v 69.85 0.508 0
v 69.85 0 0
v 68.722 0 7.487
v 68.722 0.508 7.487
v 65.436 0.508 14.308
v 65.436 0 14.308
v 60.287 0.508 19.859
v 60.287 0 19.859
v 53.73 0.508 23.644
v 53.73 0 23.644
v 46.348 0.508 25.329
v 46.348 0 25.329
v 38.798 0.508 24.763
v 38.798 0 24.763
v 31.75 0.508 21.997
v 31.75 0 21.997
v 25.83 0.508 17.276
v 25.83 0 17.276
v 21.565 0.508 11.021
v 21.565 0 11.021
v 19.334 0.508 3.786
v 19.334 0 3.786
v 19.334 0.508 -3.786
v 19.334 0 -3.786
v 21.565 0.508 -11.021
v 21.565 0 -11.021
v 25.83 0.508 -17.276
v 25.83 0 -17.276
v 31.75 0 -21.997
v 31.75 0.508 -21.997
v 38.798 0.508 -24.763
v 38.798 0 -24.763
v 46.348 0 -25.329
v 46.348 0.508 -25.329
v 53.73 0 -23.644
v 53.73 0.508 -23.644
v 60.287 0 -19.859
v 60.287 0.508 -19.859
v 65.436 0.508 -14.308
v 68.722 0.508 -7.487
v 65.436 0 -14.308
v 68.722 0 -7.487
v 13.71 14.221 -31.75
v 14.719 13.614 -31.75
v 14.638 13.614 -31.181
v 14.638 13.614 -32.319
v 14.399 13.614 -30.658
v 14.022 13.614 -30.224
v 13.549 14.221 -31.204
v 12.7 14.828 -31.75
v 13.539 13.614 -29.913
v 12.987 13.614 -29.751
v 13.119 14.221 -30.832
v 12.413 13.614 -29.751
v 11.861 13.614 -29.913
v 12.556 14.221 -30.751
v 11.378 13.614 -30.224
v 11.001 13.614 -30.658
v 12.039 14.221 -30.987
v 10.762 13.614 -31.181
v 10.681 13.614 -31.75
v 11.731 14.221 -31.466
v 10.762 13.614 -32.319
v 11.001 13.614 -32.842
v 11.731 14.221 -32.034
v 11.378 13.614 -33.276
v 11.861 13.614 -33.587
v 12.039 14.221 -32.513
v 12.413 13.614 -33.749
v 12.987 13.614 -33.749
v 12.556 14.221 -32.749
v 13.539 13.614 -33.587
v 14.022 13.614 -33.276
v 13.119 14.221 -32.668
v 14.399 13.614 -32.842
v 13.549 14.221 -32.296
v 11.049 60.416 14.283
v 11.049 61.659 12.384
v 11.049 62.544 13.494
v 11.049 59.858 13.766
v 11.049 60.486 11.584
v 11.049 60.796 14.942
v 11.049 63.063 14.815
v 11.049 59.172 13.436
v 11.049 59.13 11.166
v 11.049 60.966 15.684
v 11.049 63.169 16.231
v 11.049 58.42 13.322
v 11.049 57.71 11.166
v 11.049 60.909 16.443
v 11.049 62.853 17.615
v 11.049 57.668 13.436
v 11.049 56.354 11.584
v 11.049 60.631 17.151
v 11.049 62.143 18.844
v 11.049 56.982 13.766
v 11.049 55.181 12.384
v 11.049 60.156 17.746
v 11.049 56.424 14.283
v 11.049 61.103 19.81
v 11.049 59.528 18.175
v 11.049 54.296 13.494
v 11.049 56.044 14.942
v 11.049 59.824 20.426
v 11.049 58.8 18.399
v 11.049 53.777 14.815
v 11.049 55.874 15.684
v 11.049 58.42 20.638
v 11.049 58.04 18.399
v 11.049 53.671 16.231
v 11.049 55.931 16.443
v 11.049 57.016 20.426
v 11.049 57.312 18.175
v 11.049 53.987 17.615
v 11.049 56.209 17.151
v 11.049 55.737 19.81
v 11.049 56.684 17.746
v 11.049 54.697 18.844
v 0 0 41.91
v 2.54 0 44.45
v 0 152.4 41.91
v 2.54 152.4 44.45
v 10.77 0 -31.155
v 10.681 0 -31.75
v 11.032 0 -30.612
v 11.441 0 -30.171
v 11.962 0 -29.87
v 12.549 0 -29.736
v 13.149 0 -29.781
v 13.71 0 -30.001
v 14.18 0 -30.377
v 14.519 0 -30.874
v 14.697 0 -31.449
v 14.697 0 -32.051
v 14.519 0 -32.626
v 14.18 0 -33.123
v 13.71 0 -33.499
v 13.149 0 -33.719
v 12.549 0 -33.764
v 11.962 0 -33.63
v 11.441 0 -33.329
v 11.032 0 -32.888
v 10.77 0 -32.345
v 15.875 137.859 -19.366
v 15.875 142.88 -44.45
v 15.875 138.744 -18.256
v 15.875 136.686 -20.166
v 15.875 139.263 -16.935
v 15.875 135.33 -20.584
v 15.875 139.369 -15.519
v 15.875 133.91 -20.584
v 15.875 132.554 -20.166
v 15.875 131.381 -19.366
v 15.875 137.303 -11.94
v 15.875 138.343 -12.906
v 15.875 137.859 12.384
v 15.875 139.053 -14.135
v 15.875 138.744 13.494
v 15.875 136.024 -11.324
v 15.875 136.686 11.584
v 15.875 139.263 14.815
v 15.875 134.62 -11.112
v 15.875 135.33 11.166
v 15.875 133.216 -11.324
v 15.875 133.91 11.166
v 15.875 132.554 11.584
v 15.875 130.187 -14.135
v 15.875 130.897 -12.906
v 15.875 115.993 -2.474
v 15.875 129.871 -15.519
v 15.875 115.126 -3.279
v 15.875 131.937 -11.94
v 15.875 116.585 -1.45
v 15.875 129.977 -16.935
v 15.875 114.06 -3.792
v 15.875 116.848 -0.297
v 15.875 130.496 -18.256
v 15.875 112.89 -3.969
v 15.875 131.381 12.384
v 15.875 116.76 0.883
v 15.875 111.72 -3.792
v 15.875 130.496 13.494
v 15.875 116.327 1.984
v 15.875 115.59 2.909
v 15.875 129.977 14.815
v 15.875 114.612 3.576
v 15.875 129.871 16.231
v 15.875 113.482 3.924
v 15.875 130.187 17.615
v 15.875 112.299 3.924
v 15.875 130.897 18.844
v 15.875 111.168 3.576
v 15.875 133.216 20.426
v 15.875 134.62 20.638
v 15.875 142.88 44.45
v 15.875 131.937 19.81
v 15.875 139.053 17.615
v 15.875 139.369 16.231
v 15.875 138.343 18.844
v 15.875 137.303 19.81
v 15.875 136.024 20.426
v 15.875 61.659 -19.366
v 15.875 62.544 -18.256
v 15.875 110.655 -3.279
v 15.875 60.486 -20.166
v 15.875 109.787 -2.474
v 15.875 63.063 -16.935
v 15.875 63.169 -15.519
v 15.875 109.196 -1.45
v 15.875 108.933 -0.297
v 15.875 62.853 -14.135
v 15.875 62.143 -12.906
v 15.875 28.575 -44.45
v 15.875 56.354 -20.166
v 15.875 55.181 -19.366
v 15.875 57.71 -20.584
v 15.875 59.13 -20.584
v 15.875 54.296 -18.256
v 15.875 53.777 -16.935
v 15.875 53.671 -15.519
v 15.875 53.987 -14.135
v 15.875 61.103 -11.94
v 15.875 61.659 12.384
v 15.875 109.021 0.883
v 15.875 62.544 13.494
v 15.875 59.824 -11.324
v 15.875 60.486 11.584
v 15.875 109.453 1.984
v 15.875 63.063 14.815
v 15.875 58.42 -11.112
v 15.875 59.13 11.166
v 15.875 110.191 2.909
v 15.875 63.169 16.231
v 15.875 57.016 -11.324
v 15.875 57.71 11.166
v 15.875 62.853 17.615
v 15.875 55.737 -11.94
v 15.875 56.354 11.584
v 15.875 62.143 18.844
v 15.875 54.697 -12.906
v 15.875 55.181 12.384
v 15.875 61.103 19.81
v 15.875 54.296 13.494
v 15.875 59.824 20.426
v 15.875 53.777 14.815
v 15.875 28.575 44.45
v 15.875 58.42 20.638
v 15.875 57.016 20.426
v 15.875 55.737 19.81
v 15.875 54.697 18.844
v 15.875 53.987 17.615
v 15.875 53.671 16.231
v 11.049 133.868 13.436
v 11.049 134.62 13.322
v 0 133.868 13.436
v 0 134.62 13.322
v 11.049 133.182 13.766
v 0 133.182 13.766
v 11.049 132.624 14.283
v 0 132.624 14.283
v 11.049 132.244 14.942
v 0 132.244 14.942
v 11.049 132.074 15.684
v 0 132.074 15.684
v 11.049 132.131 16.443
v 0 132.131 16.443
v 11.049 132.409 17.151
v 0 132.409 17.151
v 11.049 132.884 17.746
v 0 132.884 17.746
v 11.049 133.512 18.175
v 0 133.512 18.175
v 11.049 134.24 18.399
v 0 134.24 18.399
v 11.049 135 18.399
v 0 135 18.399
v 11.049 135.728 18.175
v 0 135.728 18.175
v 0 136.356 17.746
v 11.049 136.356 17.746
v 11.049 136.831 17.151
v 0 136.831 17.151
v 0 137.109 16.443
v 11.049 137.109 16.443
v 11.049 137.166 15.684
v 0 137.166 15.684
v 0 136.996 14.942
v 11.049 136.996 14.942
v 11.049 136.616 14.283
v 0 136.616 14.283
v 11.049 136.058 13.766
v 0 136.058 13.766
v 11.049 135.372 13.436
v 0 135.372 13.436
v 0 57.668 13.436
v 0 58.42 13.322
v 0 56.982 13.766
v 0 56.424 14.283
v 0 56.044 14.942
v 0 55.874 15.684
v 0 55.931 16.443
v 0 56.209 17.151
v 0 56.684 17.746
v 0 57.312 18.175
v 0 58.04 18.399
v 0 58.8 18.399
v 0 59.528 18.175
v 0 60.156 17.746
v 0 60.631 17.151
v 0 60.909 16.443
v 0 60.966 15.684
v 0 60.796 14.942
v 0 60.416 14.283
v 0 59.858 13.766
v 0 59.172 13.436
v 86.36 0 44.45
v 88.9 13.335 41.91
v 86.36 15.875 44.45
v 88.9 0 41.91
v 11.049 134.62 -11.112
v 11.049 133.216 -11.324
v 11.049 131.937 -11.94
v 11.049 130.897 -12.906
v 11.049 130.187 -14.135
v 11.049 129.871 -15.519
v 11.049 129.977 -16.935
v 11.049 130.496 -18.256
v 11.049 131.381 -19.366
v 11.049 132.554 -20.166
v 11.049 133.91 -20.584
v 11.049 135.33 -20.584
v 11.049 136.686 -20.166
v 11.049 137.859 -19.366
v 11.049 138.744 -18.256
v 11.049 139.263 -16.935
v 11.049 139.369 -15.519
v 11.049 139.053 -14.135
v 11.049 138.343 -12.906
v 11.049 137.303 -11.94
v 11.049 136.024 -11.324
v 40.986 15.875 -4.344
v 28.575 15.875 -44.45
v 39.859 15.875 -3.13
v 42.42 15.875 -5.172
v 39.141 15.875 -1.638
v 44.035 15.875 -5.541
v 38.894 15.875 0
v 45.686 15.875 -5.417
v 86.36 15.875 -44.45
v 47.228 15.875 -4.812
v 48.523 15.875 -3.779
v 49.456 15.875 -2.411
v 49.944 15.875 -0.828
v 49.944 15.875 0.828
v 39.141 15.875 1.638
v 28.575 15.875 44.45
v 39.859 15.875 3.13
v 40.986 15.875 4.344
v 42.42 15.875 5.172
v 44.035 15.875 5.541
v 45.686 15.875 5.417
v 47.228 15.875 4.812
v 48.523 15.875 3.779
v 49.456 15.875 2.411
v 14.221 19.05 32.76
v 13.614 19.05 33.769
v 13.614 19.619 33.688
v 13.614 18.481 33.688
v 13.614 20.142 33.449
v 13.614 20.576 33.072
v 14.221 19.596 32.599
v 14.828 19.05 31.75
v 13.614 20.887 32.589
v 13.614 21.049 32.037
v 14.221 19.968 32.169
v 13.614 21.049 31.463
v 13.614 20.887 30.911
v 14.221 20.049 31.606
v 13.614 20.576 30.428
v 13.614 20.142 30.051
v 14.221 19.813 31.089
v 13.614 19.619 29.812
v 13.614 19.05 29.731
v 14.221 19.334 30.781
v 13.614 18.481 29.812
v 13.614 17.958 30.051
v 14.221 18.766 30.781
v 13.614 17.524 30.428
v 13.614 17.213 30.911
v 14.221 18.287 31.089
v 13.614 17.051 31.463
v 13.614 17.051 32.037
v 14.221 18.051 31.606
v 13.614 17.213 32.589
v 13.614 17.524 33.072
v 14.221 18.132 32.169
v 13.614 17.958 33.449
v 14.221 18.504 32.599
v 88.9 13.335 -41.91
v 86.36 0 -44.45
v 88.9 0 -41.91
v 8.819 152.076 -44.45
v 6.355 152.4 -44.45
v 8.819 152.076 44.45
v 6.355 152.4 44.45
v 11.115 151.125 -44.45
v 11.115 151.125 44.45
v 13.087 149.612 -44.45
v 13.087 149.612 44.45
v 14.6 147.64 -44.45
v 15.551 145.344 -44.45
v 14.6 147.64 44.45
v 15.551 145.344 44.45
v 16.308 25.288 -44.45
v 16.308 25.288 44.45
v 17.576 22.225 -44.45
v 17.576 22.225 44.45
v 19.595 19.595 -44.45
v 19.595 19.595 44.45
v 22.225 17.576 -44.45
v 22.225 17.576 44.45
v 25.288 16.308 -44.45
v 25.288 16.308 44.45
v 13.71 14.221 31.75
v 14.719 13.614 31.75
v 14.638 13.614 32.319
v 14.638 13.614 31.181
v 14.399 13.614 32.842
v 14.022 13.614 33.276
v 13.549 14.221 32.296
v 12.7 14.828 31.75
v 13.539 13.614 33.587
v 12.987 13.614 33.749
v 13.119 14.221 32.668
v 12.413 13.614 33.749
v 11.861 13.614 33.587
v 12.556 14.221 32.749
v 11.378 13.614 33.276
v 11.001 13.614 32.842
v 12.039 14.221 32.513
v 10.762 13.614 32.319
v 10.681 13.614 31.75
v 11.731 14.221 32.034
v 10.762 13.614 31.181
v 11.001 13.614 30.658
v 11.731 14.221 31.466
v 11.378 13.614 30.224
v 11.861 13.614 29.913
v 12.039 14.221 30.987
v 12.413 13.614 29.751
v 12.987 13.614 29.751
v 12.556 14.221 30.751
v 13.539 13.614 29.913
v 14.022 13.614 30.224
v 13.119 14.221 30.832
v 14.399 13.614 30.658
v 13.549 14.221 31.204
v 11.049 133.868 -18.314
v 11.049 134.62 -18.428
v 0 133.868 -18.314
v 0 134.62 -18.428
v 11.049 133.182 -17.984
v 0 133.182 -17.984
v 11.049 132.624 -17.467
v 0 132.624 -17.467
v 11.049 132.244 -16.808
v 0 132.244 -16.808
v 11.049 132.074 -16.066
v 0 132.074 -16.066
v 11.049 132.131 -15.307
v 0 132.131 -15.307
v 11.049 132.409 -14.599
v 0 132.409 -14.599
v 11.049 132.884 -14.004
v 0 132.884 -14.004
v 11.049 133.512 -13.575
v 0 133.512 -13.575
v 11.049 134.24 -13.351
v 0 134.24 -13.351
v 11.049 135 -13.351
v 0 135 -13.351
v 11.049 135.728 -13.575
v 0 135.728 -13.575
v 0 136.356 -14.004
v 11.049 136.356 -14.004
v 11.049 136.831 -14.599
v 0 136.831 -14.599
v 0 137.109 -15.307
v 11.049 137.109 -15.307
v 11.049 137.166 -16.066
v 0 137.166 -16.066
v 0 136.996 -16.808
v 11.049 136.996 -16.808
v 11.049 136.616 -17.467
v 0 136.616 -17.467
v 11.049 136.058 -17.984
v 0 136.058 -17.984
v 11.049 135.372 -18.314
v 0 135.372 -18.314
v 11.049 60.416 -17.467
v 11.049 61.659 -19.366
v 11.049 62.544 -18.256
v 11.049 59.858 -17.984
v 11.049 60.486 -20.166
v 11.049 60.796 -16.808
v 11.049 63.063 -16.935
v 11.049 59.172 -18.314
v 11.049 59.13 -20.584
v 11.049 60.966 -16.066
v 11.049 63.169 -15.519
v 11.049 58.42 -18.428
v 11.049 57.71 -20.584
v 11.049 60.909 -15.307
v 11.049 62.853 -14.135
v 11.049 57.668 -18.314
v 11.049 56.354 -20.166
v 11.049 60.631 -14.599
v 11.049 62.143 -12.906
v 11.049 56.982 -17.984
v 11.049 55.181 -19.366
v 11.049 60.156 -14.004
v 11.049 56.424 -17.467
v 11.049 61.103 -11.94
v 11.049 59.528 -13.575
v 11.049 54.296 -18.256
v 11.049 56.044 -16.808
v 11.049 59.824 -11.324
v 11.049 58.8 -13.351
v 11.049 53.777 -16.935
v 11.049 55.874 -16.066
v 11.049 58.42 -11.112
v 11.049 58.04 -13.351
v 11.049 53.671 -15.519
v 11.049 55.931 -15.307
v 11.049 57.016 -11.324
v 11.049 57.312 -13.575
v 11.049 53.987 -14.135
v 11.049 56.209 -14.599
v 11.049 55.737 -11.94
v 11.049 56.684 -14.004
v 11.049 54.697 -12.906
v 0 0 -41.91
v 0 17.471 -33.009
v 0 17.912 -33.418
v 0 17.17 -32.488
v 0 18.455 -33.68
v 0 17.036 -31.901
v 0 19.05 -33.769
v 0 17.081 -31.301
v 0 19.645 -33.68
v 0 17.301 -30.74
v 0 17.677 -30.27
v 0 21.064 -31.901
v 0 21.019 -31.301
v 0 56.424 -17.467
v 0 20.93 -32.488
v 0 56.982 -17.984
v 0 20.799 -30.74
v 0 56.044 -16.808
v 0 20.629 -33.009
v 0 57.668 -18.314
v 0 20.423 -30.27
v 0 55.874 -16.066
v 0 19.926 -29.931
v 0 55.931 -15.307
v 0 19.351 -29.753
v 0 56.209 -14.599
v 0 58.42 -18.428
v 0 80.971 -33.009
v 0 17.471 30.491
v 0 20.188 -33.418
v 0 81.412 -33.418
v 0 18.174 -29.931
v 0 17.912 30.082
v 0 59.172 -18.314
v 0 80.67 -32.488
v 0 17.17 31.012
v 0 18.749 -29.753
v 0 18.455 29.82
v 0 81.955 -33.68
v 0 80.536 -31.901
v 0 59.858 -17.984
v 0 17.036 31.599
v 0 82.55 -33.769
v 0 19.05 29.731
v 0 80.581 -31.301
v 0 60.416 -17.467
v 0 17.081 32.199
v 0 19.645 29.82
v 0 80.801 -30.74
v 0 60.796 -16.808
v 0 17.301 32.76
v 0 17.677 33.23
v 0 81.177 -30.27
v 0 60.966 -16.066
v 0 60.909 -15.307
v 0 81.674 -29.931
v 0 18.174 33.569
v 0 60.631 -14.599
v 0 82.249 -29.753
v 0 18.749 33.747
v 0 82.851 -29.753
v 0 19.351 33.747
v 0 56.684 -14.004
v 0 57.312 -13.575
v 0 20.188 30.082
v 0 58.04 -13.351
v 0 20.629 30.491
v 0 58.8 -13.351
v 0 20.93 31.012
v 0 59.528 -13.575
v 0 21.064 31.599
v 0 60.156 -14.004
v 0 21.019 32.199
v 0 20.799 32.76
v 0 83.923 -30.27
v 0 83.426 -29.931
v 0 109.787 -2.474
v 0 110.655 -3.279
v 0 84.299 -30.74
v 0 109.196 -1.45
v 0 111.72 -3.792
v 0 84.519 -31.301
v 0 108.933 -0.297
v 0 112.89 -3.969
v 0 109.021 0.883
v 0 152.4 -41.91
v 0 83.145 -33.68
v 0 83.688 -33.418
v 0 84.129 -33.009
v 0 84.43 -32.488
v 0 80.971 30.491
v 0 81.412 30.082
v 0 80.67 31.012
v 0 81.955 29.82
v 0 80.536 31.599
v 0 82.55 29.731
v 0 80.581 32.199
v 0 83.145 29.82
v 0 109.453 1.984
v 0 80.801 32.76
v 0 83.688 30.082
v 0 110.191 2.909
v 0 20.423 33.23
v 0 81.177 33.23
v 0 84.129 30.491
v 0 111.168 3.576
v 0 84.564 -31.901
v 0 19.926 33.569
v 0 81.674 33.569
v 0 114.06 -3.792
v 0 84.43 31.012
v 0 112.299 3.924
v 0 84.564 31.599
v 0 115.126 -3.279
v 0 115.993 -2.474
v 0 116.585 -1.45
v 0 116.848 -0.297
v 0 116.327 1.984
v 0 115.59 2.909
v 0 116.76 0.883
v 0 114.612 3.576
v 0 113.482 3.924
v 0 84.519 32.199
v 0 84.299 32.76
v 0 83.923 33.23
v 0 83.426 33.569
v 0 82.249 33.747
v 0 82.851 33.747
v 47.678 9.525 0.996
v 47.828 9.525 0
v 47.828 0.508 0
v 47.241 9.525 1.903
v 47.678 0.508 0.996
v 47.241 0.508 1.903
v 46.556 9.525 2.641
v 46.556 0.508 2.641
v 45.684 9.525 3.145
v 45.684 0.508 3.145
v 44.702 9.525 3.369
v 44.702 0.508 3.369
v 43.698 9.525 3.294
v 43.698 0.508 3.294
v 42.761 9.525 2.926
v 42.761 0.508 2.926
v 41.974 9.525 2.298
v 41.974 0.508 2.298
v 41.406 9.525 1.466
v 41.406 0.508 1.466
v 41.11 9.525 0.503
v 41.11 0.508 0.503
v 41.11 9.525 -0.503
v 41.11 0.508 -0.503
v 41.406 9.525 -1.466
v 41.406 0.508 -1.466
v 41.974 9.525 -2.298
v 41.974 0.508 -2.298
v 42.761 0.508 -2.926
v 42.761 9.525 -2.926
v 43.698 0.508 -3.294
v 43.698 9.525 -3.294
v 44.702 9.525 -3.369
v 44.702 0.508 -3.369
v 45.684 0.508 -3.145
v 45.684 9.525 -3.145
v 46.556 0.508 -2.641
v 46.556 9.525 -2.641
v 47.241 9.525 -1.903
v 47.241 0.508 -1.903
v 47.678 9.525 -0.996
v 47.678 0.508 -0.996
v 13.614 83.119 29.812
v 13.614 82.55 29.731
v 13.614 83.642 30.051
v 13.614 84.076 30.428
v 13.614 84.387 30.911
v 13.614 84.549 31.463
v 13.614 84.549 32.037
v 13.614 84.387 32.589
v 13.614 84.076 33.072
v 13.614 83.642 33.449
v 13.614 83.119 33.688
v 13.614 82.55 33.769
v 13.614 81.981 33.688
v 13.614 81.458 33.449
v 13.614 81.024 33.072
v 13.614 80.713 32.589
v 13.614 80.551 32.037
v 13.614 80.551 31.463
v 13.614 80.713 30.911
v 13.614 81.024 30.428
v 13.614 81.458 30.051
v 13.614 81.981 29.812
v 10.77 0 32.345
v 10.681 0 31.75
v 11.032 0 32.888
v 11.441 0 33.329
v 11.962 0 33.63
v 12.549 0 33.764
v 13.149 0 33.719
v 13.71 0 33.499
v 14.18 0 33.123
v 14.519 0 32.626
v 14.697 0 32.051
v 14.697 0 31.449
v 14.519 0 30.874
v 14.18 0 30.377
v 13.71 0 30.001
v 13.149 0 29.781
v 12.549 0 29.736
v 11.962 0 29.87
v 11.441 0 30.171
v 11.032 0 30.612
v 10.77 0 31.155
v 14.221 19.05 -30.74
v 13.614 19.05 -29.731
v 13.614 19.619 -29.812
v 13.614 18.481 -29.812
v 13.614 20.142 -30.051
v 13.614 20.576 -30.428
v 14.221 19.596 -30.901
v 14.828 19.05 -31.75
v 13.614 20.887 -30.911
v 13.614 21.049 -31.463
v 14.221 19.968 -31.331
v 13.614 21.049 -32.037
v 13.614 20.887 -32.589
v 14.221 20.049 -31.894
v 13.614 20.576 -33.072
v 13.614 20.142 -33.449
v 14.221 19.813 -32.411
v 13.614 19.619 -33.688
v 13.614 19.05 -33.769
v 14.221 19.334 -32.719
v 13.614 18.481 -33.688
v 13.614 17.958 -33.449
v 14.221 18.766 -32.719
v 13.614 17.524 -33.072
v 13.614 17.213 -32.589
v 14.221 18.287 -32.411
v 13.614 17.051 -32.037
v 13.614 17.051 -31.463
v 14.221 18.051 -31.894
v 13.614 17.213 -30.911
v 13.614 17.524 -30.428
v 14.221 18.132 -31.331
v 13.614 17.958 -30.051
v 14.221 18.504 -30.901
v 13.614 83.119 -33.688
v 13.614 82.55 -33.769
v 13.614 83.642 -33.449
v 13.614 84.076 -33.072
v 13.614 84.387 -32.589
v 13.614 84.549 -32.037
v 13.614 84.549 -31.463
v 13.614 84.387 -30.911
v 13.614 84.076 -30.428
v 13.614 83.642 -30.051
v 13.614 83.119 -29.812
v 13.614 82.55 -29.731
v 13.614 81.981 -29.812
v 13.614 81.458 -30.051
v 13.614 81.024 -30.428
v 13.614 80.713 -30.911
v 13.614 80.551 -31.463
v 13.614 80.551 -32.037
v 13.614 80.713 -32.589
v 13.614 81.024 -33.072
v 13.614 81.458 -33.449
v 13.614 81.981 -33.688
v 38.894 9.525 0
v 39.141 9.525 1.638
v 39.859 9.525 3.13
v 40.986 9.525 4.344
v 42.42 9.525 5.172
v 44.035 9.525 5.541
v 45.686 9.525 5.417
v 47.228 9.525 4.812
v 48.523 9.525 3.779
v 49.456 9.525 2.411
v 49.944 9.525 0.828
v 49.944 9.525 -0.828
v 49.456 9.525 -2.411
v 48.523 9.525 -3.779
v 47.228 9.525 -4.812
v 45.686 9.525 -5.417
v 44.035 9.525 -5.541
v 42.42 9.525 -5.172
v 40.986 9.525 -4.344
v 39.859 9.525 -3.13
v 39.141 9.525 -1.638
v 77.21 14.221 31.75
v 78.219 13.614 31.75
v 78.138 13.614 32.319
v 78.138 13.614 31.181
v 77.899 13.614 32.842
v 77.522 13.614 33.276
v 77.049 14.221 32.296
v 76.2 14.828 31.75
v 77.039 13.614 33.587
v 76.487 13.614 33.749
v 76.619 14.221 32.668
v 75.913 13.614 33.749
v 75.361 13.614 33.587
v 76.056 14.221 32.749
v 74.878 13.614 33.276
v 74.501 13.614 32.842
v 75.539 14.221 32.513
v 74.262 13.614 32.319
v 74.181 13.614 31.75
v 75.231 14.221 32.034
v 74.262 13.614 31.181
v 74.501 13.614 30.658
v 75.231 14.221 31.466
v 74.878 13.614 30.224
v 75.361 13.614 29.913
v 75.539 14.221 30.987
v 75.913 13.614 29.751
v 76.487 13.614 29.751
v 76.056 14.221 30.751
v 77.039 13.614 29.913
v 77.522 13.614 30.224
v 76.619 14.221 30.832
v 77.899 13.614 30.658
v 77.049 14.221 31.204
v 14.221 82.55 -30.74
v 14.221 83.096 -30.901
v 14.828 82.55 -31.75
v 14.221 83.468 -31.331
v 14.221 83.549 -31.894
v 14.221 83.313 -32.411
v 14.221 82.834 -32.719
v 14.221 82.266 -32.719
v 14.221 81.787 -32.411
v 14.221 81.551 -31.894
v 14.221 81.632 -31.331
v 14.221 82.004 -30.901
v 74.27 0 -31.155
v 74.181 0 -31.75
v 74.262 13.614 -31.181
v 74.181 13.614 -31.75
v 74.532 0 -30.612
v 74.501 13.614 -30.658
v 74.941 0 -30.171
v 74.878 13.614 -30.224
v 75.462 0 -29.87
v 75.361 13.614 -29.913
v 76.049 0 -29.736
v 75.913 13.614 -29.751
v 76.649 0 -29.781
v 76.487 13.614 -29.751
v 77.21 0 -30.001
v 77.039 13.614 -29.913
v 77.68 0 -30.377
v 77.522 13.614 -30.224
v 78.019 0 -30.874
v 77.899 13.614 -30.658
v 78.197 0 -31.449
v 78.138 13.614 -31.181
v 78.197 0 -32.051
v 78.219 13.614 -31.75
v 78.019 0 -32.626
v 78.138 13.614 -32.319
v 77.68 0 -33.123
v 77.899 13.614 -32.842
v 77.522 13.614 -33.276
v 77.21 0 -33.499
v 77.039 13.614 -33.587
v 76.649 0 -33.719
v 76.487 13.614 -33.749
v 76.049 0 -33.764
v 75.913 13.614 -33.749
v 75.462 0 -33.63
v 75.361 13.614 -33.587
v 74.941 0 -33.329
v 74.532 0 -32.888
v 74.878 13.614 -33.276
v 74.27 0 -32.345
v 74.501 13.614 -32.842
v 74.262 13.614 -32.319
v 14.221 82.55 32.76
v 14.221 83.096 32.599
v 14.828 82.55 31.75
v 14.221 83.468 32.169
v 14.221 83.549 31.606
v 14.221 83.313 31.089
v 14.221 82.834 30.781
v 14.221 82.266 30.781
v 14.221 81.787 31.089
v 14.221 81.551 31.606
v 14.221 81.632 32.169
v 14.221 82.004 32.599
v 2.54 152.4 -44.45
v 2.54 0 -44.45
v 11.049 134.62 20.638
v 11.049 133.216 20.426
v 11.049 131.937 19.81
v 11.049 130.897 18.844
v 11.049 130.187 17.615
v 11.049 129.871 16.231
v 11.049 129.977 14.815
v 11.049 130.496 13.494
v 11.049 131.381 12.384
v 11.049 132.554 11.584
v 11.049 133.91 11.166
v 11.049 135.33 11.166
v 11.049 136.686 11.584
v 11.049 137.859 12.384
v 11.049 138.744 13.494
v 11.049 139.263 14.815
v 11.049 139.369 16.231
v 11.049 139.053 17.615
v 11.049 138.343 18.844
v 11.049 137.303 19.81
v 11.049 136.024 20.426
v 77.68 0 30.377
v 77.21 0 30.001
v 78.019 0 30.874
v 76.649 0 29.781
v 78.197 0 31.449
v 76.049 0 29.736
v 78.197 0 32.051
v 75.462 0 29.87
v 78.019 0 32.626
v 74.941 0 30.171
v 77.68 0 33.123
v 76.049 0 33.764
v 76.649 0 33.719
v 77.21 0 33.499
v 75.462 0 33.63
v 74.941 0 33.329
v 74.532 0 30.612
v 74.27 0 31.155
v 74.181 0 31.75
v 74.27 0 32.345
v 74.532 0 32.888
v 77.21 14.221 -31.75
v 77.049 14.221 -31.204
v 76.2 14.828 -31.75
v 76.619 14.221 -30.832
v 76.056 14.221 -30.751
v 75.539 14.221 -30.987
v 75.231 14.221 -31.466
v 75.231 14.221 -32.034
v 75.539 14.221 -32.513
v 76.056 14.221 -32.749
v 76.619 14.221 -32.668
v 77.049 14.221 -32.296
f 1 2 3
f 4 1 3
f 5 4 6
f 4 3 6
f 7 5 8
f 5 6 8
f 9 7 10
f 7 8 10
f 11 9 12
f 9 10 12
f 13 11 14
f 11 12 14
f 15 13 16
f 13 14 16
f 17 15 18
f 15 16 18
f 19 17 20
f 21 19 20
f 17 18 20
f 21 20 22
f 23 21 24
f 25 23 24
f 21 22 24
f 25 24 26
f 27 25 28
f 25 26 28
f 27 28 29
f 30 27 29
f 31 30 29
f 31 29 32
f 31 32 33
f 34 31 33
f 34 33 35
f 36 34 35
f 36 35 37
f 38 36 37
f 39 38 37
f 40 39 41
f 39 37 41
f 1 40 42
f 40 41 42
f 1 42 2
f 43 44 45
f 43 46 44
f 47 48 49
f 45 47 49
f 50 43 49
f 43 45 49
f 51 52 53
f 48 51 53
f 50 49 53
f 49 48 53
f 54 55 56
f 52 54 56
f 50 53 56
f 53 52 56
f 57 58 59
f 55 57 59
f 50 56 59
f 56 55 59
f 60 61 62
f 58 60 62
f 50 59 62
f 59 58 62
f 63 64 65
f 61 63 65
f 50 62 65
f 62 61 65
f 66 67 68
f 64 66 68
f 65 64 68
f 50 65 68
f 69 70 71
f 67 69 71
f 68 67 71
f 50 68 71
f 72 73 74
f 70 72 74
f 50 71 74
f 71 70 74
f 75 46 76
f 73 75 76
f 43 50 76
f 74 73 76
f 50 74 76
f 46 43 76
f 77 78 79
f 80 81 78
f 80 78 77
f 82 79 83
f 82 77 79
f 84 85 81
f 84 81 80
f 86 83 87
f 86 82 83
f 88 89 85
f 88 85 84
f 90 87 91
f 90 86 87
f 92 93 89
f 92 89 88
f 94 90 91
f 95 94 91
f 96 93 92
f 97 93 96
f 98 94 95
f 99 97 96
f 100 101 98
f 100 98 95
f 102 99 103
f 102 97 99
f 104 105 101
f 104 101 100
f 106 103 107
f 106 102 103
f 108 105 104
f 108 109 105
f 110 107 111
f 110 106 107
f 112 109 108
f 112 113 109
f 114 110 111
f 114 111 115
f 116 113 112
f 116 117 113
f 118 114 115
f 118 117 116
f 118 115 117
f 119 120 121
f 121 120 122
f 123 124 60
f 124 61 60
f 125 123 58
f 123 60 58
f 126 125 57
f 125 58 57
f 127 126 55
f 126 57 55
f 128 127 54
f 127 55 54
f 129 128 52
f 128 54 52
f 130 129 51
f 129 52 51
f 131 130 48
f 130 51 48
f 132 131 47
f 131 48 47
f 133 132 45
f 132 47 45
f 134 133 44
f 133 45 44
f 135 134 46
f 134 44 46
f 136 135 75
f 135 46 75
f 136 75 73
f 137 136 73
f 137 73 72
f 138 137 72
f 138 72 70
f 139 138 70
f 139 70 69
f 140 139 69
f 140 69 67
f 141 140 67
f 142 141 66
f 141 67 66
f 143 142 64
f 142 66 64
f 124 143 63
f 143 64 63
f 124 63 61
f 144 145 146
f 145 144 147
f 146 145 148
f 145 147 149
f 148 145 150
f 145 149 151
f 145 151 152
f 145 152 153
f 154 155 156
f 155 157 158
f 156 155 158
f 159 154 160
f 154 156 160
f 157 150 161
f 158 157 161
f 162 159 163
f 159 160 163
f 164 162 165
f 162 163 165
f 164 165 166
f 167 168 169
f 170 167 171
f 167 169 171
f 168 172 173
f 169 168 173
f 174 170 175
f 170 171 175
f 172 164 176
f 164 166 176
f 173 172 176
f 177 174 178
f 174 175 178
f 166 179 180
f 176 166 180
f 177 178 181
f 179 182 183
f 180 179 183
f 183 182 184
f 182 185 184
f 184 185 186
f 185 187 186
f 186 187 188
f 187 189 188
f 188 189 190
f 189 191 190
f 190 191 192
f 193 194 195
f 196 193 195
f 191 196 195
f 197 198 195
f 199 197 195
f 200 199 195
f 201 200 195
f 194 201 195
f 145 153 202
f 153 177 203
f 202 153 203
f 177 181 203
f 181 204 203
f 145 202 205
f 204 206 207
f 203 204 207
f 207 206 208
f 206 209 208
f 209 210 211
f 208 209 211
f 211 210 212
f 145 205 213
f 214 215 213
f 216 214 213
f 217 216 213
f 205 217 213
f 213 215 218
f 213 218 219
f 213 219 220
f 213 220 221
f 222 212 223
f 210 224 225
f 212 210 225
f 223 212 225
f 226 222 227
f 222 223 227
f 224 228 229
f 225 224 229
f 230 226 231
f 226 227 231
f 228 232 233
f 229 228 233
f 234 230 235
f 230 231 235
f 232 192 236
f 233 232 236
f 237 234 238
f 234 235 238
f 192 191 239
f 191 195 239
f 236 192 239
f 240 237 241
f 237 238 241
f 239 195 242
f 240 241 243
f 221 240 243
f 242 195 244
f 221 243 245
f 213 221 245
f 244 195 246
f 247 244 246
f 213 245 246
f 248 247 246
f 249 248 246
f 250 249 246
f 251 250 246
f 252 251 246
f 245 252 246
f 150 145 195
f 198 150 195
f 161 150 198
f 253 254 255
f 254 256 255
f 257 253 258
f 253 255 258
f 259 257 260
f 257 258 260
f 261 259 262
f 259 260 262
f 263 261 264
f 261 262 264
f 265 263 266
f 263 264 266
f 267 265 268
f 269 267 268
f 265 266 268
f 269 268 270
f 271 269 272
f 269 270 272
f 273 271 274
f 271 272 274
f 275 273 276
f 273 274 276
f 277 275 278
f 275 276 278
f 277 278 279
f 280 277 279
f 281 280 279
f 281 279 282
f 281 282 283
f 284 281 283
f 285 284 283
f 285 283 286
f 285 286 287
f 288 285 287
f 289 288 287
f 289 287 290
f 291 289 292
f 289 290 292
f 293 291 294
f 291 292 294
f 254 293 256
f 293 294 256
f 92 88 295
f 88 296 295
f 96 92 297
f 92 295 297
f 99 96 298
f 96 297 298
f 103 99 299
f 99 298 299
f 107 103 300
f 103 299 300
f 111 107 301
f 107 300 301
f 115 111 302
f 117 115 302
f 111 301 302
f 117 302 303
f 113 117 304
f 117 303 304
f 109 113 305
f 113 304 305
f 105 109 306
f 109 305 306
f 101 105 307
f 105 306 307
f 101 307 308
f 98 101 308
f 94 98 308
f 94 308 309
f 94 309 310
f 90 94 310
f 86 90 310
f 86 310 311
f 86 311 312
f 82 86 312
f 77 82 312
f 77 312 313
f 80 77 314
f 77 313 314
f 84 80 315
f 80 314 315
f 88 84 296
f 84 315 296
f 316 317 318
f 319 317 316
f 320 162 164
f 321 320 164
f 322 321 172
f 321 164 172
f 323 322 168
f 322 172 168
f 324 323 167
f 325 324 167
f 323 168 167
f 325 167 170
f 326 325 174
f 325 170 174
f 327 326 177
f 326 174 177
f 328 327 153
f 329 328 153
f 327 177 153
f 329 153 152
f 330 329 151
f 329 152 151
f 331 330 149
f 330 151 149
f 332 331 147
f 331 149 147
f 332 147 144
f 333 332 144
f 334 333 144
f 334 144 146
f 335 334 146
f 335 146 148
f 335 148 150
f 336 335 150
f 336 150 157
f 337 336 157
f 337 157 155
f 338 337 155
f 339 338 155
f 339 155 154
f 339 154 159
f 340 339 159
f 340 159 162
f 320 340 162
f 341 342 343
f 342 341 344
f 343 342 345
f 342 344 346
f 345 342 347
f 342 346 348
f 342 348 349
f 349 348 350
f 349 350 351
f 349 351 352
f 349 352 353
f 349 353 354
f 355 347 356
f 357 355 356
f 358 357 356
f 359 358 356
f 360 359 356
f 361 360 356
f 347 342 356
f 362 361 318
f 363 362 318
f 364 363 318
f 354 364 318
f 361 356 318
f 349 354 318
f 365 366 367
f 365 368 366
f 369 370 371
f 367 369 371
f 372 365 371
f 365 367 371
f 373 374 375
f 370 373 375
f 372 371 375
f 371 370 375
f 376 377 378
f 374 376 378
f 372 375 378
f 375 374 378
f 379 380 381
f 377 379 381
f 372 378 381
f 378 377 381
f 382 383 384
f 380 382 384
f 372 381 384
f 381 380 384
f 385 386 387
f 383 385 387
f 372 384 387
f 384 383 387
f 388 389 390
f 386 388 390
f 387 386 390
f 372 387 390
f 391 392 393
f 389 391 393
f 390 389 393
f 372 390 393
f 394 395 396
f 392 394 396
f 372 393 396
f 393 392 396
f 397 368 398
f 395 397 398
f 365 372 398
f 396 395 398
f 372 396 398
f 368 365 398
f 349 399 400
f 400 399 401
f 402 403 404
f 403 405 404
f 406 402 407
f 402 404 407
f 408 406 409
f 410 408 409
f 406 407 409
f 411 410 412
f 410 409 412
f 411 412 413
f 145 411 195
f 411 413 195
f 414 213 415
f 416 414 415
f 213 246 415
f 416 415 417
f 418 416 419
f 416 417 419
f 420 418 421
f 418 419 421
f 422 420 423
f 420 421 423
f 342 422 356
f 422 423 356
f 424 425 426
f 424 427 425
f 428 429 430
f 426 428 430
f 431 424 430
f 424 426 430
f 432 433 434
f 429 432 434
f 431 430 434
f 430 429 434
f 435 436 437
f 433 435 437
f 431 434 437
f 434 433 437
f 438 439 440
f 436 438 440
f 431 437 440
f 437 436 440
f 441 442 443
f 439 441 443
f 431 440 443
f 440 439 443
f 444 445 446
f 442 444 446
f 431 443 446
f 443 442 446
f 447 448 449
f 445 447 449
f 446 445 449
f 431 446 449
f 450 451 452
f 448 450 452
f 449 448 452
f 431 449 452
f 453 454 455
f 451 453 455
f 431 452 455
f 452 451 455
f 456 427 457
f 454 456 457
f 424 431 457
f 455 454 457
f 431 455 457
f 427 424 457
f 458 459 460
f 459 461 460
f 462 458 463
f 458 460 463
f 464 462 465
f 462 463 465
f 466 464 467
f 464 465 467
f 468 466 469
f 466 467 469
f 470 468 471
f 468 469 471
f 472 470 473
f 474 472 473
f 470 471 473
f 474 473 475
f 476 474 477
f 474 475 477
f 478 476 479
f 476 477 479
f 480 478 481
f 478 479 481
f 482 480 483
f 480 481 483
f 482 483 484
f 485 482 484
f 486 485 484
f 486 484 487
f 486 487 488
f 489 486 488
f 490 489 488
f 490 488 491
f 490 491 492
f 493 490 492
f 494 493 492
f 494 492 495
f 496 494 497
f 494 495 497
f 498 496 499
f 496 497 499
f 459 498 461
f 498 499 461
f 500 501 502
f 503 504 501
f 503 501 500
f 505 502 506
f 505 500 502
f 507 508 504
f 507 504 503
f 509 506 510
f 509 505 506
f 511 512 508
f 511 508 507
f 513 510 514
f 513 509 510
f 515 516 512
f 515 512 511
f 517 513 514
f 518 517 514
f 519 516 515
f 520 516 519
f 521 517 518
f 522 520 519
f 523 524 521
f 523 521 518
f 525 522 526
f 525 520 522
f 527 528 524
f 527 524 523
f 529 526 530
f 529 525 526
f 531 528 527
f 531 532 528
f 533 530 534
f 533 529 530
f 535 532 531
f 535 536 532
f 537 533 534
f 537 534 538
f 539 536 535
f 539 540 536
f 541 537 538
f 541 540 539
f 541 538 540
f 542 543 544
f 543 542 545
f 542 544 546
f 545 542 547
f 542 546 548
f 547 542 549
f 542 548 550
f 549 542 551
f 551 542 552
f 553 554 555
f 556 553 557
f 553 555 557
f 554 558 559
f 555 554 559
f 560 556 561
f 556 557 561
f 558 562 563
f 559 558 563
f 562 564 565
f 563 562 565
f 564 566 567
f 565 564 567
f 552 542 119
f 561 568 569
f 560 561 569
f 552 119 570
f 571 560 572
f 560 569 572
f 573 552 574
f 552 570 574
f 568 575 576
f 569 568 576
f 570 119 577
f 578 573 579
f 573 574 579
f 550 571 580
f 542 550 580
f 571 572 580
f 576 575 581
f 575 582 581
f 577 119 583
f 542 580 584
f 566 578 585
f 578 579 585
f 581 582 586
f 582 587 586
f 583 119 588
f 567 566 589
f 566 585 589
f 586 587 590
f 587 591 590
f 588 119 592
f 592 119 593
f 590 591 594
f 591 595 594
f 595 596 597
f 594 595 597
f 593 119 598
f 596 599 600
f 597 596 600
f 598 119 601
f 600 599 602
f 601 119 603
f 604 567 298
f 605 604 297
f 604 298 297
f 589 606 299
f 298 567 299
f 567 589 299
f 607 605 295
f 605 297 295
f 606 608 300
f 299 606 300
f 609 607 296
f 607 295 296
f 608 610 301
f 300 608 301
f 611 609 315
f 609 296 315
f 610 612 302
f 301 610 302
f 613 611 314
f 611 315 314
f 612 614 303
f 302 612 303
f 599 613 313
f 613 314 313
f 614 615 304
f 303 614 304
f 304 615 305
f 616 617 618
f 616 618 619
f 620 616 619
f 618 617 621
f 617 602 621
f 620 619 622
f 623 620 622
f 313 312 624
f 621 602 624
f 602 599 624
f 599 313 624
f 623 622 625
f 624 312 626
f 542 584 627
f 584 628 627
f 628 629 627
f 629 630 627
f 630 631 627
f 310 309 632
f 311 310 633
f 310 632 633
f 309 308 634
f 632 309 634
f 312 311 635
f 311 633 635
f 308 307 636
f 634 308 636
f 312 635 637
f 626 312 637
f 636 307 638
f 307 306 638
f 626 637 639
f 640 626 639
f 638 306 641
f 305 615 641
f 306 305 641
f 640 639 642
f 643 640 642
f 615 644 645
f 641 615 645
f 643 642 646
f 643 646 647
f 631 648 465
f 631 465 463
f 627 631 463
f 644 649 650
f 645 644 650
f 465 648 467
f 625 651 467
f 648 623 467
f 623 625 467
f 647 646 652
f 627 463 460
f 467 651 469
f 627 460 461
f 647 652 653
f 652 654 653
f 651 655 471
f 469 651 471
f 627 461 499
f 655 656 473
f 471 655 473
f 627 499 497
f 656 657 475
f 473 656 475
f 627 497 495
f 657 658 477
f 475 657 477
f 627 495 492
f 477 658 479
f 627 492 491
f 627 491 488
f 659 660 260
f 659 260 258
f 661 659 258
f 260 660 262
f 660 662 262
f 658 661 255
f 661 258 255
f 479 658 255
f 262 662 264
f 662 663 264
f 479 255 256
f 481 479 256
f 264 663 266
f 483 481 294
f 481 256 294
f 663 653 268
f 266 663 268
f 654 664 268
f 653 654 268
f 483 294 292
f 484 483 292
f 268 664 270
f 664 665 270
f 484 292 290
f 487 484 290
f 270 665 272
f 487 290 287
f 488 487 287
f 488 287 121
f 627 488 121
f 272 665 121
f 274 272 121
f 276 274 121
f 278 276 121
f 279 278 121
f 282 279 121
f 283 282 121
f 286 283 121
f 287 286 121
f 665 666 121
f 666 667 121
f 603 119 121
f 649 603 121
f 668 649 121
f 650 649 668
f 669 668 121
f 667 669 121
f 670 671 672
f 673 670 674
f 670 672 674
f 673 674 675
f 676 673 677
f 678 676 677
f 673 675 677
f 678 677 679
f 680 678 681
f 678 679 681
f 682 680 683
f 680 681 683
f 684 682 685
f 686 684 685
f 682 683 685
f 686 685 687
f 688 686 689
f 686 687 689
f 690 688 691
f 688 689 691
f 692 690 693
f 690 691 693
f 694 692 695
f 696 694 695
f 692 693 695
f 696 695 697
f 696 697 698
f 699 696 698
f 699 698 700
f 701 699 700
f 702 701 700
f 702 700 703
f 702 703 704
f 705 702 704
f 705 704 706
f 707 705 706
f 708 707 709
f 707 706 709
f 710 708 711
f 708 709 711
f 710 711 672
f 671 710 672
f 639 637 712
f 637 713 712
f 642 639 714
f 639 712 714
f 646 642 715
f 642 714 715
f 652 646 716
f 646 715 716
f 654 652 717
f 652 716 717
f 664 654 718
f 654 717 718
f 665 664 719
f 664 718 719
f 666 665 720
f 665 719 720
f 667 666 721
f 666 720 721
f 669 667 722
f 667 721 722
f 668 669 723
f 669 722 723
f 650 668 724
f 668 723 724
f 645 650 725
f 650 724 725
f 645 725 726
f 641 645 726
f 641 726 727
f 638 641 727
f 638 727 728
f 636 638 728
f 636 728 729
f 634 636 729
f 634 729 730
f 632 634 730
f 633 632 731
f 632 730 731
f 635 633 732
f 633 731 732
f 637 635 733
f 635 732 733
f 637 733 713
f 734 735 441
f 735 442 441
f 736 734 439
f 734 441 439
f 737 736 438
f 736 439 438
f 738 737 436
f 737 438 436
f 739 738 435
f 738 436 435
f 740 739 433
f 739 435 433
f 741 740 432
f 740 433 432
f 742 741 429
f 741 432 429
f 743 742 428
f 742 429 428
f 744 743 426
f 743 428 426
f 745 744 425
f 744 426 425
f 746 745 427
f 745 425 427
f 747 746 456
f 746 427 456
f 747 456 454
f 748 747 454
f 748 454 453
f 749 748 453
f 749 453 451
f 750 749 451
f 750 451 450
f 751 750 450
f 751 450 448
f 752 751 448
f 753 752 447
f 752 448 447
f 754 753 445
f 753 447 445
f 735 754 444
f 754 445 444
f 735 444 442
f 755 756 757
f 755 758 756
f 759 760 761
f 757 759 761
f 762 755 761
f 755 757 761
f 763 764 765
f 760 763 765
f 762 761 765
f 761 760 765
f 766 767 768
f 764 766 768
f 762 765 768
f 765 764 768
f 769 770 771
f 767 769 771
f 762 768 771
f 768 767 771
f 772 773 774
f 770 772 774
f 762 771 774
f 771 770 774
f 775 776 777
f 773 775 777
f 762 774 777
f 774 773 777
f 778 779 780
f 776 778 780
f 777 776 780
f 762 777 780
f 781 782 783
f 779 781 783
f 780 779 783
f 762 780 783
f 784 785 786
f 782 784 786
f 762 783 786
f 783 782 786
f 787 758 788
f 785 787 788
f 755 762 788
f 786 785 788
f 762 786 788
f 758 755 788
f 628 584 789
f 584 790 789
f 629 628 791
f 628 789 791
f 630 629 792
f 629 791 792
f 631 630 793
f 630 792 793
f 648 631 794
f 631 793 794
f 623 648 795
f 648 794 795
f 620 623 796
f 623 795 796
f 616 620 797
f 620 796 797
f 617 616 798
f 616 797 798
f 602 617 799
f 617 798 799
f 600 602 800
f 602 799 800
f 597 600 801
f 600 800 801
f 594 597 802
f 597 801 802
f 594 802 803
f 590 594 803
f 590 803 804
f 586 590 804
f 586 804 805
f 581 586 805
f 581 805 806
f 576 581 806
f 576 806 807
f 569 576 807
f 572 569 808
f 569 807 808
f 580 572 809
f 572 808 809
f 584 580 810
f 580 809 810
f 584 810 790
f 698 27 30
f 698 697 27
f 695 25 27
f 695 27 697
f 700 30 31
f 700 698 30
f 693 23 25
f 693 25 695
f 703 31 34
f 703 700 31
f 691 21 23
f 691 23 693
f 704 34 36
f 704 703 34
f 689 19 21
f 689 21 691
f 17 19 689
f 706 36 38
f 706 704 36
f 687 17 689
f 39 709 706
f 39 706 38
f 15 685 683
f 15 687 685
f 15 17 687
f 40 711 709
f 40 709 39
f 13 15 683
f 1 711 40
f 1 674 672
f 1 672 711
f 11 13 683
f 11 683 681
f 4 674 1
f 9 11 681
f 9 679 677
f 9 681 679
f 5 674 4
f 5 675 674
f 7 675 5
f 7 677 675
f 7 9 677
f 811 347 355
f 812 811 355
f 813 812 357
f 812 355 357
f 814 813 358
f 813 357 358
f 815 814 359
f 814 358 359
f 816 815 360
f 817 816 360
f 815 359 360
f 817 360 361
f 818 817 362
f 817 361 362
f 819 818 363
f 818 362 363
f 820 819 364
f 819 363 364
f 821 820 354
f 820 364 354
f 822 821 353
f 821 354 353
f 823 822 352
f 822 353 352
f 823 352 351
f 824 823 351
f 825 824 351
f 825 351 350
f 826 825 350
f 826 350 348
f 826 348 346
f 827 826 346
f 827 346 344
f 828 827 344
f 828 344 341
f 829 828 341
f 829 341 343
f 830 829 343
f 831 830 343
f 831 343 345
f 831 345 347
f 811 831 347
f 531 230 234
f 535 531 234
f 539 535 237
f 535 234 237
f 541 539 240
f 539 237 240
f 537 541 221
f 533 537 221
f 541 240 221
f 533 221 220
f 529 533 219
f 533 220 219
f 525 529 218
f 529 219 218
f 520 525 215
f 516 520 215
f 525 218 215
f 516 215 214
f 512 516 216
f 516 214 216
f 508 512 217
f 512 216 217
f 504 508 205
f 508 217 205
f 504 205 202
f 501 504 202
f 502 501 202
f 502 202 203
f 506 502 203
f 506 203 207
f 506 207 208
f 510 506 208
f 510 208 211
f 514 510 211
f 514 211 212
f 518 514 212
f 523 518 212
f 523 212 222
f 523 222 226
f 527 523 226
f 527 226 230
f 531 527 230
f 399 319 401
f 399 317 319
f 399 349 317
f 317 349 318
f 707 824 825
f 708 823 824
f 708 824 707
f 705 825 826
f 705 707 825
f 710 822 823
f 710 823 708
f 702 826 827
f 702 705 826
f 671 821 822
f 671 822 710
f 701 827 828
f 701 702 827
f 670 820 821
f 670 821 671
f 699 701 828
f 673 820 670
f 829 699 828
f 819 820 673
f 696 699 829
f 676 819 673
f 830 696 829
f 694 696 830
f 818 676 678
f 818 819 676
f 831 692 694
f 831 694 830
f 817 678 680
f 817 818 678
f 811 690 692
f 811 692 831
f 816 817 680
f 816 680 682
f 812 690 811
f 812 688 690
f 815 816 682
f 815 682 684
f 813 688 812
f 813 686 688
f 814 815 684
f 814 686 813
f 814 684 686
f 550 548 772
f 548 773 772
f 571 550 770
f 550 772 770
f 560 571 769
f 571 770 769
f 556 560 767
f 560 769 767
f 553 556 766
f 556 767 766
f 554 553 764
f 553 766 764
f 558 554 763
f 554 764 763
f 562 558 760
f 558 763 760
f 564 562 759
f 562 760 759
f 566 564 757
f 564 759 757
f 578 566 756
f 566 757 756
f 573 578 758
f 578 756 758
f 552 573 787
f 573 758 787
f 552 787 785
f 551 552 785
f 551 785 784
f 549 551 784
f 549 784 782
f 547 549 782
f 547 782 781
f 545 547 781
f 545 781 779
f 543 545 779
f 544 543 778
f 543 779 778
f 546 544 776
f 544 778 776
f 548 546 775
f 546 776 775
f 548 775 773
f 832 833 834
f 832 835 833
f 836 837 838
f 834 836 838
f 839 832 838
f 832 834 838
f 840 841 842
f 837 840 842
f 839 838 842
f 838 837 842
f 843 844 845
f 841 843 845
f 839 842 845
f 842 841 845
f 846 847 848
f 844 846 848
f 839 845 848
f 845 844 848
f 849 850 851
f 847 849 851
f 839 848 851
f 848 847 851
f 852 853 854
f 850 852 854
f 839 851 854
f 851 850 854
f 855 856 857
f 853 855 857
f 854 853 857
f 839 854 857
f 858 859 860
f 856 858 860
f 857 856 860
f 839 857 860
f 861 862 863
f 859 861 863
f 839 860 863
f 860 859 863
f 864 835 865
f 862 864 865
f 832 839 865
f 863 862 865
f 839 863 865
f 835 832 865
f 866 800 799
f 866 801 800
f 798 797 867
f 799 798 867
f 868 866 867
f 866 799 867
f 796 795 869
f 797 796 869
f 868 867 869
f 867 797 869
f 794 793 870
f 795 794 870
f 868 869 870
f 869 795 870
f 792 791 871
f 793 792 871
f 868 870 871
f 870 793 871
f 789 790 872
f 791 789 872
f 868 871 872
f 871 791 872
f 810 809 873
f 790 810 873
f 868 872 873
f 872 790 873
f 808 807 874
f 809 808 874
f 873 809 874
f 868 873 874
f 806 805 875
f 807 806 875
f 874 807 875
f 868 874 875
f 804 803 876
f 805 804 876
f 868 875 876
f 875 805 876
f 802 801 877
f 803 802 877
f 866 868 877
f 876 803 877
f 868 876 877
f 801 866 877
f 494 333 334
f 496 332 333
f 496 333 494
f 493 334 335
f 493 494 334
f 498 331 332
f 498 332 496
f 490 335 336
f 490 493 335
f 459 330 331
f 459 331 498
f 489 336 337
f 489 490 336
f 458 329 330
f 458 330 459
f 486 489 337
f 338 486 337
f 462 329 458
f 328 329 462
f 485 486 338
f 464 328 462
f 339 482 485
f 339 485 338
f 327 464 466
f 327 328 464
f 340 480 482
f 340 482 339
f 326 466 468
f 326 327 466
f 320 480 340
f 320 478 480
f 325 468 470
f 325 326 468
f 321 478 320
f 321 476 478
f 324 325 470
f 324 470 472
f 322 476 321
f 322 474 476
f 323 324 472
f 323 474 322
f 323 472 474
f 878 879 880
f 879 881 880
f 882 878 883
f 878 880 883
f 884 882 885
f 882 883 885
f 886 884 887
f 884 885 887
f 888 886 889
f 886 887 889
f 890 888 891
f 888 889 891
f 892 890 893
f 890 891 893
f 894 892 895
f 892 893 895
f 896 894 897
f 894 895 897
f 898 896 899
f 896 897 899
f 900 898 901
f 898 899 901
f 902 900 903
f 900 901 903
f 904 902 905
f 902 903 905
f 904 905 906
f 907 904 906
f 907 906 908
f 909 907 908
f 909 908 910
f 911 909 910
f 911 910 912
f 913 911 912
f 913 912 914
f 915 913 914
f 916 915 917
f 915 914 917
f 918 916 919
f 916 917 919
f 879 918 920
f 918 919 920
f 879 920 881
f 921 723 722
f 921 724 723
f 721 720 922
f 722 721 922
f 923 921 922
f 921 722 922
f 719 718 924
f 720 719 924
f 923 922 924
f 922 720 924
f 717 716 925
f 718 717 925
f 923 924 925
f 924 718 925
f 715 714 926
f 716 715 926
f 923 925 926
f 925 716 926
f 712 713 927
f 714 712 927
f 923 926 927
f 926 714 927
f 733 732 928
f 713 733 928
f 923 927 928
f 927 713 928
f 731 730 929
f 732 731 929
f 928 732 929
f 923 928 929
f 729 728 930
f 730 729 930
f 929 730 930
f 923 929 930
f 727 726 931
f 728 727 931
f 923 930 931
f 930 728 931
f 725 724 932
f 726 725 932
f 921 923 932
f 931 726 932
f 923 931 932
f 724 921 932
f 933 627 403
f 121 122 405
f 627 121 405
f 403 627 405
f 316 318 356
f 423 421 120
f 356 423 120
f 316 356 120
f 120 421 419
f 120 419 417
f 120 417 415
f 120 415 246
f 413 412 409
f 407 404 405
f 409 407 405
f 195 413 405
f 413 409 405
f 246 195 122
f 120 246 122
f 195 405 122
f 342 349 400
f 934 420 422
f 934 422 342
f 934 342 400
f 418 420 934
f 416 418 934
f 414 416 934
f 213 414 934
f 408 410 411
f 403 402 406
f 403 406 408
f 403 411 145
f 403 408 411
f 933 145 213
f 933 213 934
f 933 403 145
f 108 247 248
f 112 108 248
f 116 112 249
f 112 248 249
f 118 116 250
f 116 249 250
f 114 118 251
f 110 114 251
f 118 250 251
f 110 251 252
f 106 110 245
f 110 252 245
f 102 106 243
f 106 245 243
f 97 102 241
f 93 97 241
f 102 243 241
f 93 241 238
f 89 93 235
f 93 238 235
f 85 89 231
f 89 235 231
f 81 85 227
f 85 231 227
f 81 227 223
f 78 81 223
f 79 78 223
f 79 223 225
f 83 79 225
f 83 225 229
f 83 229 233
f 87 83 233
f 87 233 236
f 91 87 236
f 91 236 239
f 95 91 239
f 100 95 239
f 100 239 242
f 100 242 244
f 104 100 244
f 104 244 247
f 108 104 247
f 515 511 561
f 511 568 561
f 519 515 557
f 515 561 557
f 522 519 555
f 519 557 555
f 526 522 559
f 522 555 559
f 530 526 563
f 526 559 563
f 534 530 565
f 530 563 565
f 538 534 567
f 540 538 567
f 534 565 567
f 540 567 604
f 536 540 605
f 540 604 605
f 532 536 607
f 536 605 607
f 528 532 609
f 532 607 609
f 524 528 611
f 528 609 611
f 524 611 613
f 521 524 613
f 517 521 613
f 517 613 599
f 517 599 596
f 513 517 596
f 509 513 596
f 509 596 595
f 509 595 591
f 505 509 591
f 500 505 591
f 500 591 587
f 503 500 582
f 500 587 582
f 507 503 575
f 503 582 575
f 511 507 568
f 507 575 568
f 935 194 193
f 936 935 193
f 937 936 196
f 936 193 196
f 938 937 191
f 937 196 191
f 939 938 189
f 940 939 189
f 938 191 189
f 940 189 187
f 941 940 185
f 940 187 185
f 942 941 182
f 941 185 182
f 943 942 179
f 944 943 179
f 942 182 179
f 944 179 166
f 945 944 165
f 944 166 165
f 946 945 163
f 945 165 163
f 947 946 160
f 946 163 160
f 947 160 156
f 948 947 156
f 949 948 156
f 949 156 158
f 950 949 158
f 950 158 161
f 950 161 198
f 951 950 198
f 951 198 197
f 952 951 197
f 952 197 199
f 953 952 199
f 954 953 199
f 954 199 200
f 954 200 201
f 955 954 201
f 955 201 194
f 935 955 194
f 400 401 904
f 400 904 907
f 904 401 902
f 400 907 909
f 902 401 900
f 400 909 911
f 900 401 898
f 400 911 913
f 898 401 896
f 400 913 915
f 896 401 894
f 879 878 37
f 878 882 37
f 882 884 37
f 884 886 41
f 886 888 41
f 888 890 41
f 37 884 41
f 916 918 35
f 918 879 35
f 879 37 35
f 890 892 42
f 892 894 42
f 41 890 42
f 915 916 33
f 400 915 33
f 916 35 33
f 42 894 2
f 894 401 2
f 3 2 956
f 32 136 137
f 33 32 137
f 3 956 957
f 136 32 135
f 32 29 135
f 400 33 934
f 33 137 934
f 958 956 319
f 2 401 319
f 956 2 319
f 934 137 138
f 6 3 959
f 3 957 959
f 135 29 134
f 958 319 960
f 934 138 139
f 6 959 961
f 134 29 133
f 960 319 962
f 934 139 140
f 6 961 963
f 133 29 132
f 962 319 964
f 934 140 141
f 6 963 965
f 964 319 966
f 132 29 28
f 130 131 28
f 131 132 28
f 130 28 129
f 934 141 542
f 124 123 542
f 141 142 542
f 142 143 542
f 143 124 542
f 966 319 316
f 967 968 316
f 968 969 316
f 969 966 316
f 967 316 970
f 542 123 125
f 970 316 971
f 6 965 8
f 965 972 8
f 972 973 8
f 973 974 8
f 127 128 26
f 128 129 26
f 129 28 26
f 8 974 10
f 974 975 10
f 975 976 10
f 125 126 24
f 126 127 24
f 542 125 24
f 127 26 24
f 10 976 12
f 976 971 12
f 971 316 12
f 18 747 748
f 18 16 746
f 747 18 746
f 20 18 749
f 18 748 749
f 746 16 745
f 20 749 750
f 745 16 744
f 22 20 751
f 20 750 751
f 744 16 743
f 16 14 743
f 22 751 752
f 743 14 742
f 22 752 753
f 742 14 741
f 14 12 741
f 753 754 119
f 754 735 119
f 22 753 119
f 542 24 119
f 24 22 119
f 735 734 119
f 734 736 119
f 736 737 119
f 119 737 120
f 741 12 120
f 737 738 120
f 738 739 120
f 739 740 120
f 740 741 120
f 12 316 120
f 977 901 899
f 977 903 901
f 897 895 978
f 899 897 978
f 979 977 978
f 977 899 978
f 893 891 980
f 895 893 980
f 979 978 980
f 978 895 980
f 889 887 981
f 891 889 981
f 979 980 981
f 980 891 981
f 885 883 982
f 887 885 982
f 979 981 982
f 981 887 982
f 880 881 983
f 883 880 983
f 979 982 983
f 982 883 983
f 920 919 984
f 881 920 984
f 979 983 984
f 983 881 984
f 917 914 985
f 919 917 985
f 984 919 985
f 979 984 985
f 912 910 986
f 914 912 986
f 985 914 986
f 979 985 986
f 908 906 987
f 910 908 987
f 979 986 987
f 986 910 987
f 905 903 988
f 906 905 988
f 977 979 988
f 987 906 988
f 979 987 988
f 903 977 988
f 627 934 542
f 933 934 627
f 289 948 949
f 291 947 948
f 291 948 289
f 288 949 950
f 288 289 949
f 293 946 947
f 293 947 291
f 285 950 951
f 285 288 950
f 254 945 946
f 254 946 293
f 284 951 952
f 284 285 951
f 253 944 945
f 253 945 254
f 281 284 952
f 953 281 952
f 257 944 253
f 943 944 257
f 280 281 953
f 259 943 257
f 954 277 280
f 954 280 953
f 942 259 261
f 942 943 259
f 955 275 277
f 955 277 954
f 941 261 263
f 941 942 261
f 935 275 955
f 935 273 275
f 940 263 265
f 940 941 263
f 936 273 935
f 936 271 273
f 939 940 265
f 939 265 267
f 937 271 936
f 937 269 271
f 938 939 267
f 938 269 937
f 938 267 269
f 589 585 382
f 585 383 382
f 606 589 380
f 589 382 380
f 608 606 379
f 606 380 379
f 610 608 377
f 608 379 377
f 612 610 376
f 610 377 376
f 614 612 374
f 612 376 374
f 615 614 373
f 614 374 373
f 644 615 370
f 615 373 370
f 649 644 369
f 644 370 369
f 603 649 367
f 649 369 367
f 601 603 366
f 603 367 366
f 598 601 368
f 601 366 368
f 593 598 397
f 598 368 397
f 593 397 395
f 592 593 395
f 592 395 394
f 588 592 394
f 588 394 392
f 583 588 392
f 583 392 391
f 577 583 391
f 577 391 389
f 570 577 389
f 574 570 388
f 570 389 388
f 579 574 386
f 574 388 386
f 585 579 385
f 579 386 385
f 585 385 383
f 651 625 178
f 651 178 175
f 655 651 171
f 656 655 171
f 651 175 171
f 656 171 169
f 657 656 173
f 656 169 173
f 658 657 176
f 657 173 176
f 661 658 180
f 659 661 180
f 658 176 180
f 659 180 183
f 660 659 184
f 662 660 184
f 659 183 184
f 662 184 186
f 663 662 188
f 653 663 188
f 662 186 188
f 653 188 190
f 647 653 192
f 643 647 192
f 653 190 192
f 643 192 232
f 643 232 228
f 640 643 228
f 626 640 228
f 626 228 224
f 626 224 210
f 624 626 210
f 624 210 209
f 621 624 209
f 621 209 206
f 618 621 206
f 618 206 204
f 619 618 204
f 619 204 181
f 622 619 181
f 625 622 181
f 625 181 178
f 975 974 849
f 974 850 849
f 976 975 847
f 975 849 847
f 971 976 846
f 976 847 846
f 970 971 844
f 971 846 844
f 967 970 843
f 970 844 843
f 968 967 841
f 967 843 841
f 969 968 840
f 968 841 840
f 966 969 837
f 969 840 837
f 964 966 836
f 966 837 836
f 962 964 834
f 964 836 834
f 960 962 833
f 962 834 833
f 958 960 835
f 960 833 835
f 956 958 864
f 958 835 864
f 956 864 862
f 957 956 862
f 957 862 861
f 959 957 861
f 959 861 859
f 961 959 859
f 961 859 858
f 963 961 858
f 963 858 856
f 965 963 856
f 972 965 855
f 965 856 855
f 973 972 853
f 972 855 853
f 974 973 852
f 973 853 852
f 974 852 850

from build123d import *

# Parameters (mm, degrees)
BASESTEELANGLE_DEPTH                             = 44.45
F_3_8_16_TAPPED_HOLE1_D                          = 7.9375
CBORE_FOR_10_SOCKET_HEAD_CAP_SCREW2_D            = 5.1054
CBORE_FOR_10_SOCKET_HEAD_CAP_SCREW2_CBORE_D      = 9.525
CBORE_FOR_10_SOCKET_HEAD_CAP_SCREW2_CBORE_DEPTH  = 4.826
SKETCH16_W                                       = 94.308892356
SKETCH16_H                                       = 144.501300052
CUT_EXTRUDE1_DEPTH                               = 25.4
F_10_32_TAPPED_HOLE3_D                           = 4.0386
F_10_32_TAPPED_HOLE3_DEPTH                       = 13.6144
F_10_32_TAPPED_HOLE3_TIP                         = 1.213317848
F_10_32_TAPPED_HOLE4_D                           = 4.0386
F_10_32_TAPPED_HOLE4_DEPTH                       = 13.6144
F_10_32_TAPPED_HOLE4_TIP                         = 1.213317848
CBORE_FOR_1_4_SOCKET_HEAD_CAP_SCREW1_D           = 6.7564
CBORE_FOR_1_4_SOCKET_HEAD_CAP_SCREW1_CBORE_D     = 11.1125
CBORE_FOR_1_4_SOCKET_HEAD_CAP_SCREW1_CBORE_DEPTH = 6.35
SKETCH19_R                                       = 25.4
CUT_EXTRUDE2_DEPTH                               = 0.508
CHAMFER1_SIZE                                    = 2.54


with BuildPart() as part:
    # Sketch1 → BaseSteelAngle (new body, symmetric)
    with BuildSketch(Plane.XY):
        with BuildLine():
            Line((0, 0), (0, 152.4))
            Line((0, 152.4), (6.35508, 152.4))
            ThreePointArc((6.35508, 152.4), (13.086679988, 149.611679988), (15.875, 142.88008))
            Line((15.875, 142.88008), (15.875, 28.575))
            ThreePointArc((15.875, 28.575), (19.594743879, 19.594743879), (28.575, 15.875))
            Line((28.575, 15.875), (142.88008, 15.875))
            ThreePointArc((142.88008, 15.875), (149.611679988, 13.086679988), (152.4, 6.35508))
            Line((152.4, 6.35508), (152.4, 0))
            Line((152.4, 0), (0, 0))
        make_face()
    extrude(amount=BASESTEELANGLE_DEPTH, both=True)

    # 3/8-16 Tapped Hole1 (through all)
    with Locations(Plane.ZY):
        with Locations((0, 112.8903)):
            Hole(F_3_8_16_TAPPED_HOLE1_D / 2)

    # CBORE for #10 Socket Head Cap Screw2 (through all)
    with Locations(Plane(origin=(15.875, 58.160616164, 30.43670953), x_dir=(0, 0, 1), z_dir=(1, 0, 0))):
        with Locations((-46.31170953, -0.259383836), (-14.56170953, -0.259383836), (-14.56170953, -76.459383836), (-46.31170953, -76.459383836)):
            CounterBoreHole(CBORE_FOR_10_SOCKET_HEAD_CAP_SCREW2_D / 2, CBORE_FOR_10_SOCKET_HEAD_CAP_SCREW2_CBORE_D / 2, CBORE_FOR_10_SOCKET_HEAD_CAP_SCREW2_CBORE_DEPTH)

    # Sketch16 → Cut-Extrude1 (cut, symmetric)
    with BuildSketch(Plane(origin=(0, 0, 0), x_dir=(1, 0, 0), z_dir=(0, 1, 0))):
        with Locations((136.054446178, 1.452938118)):
            Rectangle(SKETCH16_W, SKETCH16_H)
    extrude(amount=CUT_EXTRUDE1_DEPTH, both=True, mode=Mode.SUBTRACT)

    # #10-32 Tapped Hole3
    with Locations(Plane.ZY):
        with Locations((-31.75, 82.55), (31.75, 82.55), (31.75, 19.05), (-31.75, 19.05)):
            Hole(F_10_32_TAPPED_HOLE3_D / 2, depth=F_10_32_TAPPED_HOLE3_DEPTH)
            with Locations((0, 0, -(F_10_32_TAPPED_HOLE3_DEPTH + F_10_32_TAPPED_HOLE3_TIP / 2))):  # 118° drill point
                Cone(0, F_10_32_TAPPED_HOLE3_D / 2, F_10_32_TAPPED_HOLE3_TIP, mode=Mode.SUBTRACT)

    # #10-32 Tapped Hole4
    with Locations(Plane.XZ):
        with Locations((76.2, 31.75), (12.7, 31.75), (12.7, -31.75), (76.2, -31.75)):
            Hole(F_10_32_TAPPED_HOLE4_D / 2, depth=F_10_32_TAPPED_HOLE4_DEPTH)
            with Locations((0, 0, -(F_10_32_TAPPED_HOLE4_DEPTH + F_10_32_TAPPED_HOLE4_TIP / 2))):  # 118° drill point
                Cone(0, F_10_32_TAPPED_HOLE4_D / 2, F_10_32_TAPPED_HOLE4_TIP, mode=Mode.SUBTRACT)

    # CBORE for 1/4 Socket Head Cap Screw1 (through all)
    with Locations(Plane(origin=(0, 15.875, 0), x_dir=(-1, 0, 0), z_dir=(0, 1, 0))):
        with Locations((-44.45, 0)):
            CounterBoreHole(CBORE_FOR_1_4_SOCKET_HEAD_CAP_SCREW1_D / 2, CBORE_FOR_1_4_SOCKET_HEAD_CAP_SCREW1_CBORE_D / 2, CBORE_FOR_1_4_SOCKET_HEAD_CAP_SCREW1_CBORE_DEPTH)

    # Sketch19 → Cut-Extrude2 (cut)
    with BuildSketch(Plane.XZ):
        with Locations((44.45, 0)):
            Circle(SKETCH19_R)
    extrude(amount=-CUT_EXTRUDE2_DEPTH, mode=Mode.SUBTRACT)

    # Chamfer1
    chamfer1_edges = [part.edges().sort_by_distance(p)[0] for p in [
        (0, 76.2, 44.45),
        (88.9, 7.9375, -44.45),
        (88.9, 7.9375, 44.45),
        (88.9, 15.875, 0),
        (0, 76.2, -44.45),
    ]]
    chamfer(chamfer1_edges, length=CHAMFER1_SIZE)


solid = part.part
